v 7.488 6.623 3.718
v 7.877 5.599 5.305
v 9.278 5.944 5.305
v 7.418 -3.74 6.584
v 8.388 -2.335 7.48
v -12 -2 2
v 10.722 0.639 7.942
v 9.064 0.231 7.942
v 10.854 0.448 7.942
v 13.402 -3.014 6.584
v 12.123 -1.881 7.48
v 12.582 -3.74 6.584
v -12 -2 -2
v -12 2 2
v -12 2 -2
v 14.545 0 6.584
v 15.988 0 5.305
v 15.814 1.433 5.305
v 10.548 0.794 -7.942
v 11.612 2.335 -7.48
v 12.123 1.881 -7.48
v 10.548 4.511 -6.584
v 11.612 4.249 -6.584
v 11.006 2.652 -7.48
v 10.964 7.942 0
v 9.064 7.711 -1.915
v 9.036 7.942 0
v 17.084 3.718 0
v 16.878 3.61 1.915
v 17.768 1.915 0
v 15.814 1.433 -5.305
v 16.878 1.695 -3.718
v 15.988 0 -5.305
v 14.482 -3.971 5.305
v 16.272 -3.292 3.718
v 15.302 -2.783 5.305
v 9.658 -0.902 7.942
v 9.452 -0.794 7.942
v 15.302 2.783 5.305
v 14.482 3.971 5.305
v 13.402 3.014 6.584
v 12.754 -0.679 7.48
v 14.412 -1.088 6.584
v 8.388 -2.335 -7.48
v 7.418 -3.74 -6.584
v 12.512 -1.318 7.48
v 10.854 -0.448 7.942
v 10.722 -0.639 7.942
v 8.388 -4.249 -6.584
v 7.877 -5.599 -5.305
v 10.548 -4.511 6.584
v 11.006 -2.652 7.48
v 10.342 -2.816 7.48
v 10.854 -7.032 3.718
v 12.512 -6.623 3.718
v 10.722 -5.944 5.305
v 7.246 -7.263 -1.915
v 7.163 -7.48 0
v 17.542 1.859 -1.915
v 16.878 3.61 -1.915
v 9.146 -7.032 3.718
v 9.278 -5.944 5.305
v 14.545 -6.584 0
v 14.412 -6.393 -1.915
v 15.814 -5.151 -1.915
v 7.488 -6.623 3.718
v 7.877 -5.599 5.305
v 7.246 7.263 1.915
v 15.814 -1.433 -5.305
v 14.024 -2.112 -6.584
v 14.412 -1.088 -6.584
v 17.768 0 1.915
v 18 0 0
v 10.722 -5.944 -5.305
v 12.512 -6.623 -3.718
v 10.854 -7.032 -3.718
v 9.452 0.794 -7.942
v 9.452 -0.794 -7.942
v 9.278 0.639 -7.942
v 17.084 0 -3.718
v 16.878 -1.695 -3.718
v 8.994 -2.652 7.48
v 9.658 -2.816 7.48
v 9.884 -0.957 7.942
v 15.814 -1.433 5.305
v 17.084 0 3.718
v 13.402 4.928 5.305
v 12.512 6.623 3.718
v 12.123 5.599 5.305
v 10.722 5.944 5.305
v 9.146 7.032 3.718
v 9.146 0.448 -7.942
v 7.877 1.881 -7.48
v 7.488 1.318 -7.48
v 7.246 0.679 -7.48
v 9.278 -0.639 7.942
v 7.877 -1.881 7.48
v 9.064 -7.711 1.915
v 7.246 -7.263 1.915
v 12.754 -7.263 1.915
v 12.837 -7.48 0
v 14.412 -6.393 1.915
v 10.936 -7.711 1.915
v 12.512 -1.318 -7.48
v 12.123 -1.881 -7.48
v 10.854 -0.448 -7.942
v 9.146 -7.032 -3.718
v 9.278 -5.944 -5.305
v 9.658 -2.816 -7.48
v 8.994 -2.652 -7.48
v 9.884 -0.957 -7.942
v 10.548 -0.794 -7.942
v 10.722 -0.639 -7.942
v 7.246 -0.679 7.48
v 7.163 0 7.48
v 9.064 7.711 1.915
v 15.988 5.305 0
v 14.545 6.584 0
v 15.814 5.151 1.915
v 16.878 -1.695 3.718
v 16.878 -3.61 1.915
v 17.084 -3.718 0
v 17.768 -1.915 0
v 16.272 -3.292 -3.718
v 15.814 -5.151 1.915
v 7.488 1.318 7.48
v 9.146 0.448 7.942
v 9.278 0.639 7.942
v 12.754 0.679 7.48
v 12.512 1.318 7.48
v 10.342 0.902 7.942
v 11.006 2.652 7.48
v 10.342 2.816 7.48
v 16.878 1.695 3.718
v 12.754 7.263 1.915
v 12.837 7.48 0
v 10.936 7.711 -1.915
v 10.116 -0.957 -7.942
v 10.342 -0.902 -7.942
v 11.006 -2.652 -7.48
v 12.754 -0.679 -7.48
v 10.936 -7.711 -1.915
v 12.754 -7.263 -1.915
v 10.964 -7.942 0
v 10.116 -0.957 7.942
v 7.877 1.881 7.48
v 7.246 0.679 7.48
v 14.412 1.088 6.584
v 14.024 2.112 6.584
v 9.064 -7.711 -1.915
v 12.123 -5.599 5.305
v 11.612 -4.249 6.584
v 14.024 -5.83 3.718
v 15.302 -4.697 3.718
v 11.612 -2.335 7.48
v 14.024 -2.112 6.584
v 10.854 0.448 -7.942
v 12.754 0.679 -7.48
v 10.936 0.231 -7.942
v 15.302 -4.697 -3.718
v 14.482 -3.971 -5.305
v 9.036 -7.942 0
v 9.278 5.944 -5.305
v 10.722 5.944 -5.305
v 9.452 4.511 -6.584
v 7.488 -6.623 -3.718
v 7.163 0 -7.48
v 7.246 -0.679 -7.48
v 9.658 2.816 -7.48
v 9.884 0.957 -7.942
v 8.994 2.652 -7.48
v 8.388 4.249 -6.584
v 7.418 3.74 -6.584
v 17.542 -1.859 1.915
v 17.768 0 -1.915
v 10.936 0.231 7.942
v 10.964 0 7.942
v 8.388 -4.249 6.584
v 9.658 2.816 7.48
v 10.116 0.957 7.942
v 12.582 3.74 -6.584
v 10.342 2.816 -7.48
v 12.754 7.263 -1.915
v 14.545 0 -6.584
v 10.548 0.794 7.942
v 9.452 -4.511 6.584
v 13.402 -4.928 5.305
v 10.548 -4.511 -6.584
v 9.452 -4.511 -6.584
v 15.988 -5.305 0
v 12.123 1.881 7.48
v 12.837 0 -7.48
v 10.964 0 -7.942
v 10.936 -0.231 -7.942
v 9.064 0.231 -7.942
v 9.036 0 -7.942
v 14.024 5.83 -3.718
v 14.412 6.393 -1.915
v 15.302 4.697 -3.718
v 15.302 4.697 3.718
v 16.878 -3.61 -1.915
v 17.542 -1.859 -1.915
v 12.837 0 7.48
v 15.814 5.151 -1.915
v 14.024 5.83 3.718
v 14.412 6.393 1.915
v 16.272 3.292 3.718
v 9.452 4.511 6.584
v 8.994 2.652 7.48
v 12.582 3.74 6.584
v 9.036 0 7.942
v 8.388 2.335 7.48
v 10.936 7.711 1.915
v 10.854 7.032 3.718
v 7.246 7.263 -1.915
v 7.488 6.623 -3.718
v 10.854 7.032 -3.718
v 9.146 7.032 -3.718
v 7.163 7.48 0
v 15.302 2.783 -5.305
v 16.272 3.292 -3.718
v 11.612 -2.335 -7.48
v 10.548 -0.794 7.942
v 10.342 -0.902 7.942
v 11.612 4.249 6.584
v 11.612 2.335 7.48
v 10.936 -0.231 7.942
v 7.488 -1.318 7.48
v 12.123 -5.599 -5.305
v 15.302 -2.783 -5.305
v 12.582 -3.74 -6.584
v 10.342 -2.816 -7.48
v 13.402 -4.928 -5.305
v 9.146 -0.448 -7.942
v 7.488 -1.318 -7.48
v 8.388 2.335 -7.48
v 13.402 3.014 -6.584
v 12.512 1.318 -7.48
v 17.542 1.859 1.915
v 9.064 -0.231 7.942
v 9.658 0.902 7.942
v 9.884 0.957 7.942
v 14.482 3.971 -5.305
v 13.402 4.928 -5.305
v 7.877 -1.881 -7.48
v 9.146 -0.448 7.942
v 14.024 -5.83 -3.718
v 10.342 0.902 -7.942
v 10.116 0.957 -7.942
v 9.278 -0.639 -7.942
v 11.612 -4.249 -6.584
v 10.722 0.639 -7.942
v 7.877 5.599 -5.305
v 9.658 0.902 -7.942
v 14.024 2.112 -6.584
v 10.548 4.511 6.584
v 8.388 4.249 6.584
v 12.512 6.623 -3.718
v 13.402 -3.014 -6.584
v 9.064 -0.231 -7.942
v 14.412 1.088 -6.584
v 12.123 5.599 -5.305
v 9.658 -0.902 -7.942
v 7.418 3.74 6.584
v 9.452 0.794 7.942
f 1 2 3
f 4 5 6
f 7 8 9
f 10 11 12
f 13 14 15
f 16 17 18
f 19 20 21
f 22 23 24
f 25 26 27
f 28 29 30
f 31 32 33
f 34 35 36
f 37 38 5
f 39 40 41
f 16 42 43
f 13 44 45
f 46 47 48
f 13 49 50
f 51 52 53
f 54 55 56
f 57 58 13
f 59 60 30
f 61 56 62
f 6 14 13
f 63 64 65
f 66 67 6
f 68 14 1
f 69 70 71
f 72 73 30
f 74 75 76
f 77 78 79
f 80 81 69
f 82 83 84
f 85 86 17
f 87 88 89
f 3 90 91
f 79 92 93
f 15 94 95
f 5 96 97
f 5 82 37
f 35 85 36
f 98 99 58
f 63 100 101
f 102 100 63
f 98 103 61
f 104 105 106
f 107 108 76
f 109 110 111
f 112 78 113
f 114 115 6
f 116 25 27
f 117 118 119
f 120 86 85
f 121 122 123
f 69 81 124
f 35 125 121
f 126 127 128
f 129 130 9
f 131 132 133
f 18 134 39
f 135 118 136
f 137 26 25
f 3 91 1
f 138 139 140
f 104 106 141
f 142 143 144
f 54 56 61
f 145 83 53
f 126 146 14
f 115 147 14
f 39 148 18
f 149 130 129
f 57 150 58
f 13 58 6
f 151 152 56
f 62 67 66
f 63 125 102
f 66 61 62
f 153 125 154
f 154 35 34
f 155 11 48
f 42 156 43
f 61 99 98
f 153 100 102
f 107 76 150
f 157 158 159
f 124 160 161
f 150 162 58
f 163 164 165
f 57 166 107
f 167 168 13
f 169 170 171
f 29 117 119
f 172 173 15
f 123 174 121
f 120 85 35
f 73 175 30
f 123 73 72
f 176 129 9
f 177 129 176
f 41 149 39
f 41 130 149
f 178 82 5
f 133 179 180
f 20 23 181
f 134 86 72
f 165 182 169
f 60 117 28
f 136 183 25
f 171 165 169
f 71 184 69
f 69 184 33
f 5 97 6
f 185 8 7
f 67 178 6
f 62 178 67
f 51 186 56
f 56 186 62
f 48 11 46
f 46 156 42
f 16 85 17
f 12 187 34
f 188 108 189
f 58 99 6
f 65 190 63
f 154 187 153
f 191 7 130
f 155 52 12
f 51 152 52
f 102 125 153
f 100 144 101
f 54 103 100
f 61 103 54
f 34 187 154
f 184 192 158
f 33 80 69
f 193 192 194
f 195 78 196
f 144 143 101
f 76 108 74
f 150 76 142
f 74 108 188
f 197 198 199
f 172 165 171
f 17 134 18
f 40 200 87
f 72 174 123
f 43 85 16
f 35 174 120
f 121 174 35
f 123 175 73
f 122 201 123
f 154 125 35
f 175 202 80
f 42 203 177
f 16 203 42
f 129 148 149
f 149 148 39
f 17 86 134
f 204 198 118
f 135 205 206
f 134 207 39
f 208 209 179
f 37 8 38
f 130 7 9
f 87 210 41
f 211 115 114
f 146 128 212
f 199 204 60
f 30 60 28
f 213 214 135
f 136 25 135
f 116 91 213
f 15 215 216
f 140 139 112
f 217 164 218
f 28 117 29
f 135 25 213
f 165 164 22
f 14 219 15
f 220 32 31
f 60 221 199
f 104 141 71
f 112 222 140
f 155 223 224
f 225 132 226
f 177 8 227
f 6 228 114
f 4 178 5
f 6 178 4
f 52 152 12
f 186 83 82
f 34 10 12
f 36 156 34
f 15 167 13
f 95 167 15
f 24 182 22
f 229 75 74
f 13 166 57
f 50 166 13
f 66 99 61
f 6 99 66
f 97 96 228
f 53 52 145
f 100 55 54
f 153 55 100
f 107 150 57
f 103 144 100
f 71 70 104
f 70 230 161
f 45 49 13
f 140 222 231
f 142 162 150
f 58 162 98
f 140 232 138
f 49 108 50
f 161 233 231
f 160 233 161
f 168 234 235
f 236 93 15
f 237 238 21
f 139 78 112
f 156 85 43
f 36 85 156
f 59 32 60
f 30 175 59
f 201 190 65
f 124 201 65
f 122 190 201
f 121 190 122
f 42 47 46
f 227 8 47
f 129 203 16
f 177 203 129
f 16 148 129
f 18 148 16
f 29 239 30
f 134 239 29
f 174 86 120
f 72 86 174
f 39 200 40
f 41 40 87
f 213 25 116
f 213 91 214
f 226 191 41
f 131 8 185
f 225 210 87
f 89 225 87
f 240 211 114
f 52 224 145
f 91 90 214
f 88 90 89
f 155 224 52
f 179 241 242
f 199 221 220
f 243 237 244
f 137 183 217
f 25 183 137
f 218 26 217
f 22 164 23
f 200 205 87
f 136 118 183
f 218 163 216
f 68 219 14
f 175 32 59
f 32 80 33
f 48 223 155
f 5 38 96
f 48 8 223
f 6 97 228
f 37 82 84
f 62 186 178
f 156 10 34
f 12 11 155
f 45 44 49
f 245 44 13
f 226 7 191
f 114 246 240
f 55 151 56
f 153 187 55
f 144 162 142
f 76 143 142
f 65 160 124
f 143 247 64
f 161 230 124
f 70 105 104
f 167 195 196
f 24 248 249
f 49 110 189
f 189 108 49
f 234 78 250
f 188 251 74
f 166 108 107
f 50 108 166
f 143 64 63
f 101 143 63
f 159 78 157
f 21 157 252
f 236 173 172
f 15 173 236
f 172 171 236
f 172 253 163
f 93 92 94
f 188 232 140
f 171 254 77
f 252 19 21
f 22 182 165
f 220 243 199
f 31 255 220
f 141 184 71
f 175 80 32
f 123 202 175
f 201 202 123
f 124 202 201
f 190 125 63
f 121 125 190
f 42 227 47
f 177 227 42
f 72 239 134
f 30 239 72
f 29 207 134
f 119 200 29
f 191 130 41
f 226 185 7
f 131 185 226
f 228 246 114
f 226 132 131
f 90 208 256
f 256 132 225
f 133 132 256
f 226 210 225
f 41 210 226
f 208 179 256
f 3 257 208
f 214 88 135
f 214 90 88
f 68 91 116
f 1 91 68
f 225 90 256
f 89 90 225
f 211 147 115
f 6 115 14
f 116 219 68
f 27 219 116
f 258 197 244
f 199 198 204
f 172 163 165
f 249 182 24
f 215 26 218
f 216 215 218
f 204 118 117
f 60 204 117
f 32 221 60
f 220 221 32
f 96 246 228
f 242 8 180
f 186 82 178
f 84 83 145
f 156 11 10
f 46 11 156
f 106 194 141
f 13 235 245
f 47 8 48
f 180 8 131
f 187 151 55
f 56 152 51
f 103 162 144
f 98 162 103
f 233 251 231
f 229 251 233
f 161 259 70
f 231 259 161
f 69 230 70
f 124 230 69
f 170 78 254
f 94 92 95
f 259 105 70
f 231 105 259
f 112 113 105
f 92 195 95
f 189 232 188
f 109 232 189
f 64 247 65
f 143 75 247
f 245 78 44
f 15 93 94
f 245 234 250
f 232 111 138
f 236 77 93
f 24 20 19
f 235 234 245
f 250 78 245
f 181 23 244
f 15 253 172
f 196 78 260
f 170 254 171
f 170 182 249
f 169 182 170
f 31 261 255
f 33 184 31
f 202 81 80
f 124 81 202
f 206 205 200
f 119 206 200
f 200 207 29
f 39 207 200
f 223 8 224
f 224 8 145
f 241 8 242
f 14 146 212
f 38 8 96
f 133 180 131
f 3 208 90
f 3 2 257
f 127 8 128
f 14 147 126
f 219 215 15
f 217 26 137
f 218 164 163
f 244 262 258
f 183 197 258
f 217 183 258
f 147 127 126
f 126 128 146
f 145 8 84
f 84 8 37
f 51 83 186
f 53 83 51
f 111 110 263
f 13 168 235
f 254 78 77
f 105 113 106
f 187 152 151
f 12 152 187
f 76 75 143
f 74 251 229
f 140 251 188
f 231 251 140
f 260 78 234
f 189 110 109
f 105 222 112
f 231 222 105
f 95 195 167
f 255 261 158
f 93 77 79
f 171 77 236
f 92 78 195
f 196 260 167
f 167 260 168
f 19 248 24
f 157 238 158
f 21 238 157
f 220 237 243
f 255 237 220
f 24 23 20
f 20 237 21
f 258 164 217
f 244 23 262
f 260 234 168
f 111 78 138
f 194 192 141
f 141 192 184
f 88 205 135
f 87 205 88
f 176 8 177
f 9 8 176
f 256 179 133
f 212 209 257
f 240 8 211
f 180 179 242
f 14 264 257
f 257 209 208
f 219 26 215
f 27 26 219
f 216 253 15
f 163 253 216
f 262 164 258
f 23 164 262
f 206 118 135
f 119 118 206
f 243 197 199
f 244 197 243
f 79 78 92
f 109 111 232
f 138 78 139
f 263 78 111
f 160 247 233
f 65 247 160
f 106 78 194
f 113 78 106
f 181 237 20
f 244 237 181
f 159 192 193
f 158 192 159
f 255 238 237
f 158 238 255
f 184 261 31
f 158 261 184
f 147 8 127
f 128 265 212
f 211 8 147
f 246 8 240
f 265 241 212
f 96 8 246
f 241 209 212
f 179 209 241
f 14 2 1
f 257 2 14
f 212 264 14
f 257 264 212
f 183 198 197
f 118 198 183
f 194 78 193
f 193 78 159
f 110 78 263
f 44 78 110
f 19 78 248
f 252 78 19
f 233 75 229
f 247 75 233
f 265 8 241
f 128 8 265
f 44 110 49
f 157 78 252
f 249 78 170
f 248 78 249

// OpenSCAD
// $fn=50;
hull() {
  translate([10, 0, 0]) {
    sphere(r=8);
  }
  translate([-10, 0, 0]) {
    cube(size=[4, 4, 4], center=true);
  }
}
